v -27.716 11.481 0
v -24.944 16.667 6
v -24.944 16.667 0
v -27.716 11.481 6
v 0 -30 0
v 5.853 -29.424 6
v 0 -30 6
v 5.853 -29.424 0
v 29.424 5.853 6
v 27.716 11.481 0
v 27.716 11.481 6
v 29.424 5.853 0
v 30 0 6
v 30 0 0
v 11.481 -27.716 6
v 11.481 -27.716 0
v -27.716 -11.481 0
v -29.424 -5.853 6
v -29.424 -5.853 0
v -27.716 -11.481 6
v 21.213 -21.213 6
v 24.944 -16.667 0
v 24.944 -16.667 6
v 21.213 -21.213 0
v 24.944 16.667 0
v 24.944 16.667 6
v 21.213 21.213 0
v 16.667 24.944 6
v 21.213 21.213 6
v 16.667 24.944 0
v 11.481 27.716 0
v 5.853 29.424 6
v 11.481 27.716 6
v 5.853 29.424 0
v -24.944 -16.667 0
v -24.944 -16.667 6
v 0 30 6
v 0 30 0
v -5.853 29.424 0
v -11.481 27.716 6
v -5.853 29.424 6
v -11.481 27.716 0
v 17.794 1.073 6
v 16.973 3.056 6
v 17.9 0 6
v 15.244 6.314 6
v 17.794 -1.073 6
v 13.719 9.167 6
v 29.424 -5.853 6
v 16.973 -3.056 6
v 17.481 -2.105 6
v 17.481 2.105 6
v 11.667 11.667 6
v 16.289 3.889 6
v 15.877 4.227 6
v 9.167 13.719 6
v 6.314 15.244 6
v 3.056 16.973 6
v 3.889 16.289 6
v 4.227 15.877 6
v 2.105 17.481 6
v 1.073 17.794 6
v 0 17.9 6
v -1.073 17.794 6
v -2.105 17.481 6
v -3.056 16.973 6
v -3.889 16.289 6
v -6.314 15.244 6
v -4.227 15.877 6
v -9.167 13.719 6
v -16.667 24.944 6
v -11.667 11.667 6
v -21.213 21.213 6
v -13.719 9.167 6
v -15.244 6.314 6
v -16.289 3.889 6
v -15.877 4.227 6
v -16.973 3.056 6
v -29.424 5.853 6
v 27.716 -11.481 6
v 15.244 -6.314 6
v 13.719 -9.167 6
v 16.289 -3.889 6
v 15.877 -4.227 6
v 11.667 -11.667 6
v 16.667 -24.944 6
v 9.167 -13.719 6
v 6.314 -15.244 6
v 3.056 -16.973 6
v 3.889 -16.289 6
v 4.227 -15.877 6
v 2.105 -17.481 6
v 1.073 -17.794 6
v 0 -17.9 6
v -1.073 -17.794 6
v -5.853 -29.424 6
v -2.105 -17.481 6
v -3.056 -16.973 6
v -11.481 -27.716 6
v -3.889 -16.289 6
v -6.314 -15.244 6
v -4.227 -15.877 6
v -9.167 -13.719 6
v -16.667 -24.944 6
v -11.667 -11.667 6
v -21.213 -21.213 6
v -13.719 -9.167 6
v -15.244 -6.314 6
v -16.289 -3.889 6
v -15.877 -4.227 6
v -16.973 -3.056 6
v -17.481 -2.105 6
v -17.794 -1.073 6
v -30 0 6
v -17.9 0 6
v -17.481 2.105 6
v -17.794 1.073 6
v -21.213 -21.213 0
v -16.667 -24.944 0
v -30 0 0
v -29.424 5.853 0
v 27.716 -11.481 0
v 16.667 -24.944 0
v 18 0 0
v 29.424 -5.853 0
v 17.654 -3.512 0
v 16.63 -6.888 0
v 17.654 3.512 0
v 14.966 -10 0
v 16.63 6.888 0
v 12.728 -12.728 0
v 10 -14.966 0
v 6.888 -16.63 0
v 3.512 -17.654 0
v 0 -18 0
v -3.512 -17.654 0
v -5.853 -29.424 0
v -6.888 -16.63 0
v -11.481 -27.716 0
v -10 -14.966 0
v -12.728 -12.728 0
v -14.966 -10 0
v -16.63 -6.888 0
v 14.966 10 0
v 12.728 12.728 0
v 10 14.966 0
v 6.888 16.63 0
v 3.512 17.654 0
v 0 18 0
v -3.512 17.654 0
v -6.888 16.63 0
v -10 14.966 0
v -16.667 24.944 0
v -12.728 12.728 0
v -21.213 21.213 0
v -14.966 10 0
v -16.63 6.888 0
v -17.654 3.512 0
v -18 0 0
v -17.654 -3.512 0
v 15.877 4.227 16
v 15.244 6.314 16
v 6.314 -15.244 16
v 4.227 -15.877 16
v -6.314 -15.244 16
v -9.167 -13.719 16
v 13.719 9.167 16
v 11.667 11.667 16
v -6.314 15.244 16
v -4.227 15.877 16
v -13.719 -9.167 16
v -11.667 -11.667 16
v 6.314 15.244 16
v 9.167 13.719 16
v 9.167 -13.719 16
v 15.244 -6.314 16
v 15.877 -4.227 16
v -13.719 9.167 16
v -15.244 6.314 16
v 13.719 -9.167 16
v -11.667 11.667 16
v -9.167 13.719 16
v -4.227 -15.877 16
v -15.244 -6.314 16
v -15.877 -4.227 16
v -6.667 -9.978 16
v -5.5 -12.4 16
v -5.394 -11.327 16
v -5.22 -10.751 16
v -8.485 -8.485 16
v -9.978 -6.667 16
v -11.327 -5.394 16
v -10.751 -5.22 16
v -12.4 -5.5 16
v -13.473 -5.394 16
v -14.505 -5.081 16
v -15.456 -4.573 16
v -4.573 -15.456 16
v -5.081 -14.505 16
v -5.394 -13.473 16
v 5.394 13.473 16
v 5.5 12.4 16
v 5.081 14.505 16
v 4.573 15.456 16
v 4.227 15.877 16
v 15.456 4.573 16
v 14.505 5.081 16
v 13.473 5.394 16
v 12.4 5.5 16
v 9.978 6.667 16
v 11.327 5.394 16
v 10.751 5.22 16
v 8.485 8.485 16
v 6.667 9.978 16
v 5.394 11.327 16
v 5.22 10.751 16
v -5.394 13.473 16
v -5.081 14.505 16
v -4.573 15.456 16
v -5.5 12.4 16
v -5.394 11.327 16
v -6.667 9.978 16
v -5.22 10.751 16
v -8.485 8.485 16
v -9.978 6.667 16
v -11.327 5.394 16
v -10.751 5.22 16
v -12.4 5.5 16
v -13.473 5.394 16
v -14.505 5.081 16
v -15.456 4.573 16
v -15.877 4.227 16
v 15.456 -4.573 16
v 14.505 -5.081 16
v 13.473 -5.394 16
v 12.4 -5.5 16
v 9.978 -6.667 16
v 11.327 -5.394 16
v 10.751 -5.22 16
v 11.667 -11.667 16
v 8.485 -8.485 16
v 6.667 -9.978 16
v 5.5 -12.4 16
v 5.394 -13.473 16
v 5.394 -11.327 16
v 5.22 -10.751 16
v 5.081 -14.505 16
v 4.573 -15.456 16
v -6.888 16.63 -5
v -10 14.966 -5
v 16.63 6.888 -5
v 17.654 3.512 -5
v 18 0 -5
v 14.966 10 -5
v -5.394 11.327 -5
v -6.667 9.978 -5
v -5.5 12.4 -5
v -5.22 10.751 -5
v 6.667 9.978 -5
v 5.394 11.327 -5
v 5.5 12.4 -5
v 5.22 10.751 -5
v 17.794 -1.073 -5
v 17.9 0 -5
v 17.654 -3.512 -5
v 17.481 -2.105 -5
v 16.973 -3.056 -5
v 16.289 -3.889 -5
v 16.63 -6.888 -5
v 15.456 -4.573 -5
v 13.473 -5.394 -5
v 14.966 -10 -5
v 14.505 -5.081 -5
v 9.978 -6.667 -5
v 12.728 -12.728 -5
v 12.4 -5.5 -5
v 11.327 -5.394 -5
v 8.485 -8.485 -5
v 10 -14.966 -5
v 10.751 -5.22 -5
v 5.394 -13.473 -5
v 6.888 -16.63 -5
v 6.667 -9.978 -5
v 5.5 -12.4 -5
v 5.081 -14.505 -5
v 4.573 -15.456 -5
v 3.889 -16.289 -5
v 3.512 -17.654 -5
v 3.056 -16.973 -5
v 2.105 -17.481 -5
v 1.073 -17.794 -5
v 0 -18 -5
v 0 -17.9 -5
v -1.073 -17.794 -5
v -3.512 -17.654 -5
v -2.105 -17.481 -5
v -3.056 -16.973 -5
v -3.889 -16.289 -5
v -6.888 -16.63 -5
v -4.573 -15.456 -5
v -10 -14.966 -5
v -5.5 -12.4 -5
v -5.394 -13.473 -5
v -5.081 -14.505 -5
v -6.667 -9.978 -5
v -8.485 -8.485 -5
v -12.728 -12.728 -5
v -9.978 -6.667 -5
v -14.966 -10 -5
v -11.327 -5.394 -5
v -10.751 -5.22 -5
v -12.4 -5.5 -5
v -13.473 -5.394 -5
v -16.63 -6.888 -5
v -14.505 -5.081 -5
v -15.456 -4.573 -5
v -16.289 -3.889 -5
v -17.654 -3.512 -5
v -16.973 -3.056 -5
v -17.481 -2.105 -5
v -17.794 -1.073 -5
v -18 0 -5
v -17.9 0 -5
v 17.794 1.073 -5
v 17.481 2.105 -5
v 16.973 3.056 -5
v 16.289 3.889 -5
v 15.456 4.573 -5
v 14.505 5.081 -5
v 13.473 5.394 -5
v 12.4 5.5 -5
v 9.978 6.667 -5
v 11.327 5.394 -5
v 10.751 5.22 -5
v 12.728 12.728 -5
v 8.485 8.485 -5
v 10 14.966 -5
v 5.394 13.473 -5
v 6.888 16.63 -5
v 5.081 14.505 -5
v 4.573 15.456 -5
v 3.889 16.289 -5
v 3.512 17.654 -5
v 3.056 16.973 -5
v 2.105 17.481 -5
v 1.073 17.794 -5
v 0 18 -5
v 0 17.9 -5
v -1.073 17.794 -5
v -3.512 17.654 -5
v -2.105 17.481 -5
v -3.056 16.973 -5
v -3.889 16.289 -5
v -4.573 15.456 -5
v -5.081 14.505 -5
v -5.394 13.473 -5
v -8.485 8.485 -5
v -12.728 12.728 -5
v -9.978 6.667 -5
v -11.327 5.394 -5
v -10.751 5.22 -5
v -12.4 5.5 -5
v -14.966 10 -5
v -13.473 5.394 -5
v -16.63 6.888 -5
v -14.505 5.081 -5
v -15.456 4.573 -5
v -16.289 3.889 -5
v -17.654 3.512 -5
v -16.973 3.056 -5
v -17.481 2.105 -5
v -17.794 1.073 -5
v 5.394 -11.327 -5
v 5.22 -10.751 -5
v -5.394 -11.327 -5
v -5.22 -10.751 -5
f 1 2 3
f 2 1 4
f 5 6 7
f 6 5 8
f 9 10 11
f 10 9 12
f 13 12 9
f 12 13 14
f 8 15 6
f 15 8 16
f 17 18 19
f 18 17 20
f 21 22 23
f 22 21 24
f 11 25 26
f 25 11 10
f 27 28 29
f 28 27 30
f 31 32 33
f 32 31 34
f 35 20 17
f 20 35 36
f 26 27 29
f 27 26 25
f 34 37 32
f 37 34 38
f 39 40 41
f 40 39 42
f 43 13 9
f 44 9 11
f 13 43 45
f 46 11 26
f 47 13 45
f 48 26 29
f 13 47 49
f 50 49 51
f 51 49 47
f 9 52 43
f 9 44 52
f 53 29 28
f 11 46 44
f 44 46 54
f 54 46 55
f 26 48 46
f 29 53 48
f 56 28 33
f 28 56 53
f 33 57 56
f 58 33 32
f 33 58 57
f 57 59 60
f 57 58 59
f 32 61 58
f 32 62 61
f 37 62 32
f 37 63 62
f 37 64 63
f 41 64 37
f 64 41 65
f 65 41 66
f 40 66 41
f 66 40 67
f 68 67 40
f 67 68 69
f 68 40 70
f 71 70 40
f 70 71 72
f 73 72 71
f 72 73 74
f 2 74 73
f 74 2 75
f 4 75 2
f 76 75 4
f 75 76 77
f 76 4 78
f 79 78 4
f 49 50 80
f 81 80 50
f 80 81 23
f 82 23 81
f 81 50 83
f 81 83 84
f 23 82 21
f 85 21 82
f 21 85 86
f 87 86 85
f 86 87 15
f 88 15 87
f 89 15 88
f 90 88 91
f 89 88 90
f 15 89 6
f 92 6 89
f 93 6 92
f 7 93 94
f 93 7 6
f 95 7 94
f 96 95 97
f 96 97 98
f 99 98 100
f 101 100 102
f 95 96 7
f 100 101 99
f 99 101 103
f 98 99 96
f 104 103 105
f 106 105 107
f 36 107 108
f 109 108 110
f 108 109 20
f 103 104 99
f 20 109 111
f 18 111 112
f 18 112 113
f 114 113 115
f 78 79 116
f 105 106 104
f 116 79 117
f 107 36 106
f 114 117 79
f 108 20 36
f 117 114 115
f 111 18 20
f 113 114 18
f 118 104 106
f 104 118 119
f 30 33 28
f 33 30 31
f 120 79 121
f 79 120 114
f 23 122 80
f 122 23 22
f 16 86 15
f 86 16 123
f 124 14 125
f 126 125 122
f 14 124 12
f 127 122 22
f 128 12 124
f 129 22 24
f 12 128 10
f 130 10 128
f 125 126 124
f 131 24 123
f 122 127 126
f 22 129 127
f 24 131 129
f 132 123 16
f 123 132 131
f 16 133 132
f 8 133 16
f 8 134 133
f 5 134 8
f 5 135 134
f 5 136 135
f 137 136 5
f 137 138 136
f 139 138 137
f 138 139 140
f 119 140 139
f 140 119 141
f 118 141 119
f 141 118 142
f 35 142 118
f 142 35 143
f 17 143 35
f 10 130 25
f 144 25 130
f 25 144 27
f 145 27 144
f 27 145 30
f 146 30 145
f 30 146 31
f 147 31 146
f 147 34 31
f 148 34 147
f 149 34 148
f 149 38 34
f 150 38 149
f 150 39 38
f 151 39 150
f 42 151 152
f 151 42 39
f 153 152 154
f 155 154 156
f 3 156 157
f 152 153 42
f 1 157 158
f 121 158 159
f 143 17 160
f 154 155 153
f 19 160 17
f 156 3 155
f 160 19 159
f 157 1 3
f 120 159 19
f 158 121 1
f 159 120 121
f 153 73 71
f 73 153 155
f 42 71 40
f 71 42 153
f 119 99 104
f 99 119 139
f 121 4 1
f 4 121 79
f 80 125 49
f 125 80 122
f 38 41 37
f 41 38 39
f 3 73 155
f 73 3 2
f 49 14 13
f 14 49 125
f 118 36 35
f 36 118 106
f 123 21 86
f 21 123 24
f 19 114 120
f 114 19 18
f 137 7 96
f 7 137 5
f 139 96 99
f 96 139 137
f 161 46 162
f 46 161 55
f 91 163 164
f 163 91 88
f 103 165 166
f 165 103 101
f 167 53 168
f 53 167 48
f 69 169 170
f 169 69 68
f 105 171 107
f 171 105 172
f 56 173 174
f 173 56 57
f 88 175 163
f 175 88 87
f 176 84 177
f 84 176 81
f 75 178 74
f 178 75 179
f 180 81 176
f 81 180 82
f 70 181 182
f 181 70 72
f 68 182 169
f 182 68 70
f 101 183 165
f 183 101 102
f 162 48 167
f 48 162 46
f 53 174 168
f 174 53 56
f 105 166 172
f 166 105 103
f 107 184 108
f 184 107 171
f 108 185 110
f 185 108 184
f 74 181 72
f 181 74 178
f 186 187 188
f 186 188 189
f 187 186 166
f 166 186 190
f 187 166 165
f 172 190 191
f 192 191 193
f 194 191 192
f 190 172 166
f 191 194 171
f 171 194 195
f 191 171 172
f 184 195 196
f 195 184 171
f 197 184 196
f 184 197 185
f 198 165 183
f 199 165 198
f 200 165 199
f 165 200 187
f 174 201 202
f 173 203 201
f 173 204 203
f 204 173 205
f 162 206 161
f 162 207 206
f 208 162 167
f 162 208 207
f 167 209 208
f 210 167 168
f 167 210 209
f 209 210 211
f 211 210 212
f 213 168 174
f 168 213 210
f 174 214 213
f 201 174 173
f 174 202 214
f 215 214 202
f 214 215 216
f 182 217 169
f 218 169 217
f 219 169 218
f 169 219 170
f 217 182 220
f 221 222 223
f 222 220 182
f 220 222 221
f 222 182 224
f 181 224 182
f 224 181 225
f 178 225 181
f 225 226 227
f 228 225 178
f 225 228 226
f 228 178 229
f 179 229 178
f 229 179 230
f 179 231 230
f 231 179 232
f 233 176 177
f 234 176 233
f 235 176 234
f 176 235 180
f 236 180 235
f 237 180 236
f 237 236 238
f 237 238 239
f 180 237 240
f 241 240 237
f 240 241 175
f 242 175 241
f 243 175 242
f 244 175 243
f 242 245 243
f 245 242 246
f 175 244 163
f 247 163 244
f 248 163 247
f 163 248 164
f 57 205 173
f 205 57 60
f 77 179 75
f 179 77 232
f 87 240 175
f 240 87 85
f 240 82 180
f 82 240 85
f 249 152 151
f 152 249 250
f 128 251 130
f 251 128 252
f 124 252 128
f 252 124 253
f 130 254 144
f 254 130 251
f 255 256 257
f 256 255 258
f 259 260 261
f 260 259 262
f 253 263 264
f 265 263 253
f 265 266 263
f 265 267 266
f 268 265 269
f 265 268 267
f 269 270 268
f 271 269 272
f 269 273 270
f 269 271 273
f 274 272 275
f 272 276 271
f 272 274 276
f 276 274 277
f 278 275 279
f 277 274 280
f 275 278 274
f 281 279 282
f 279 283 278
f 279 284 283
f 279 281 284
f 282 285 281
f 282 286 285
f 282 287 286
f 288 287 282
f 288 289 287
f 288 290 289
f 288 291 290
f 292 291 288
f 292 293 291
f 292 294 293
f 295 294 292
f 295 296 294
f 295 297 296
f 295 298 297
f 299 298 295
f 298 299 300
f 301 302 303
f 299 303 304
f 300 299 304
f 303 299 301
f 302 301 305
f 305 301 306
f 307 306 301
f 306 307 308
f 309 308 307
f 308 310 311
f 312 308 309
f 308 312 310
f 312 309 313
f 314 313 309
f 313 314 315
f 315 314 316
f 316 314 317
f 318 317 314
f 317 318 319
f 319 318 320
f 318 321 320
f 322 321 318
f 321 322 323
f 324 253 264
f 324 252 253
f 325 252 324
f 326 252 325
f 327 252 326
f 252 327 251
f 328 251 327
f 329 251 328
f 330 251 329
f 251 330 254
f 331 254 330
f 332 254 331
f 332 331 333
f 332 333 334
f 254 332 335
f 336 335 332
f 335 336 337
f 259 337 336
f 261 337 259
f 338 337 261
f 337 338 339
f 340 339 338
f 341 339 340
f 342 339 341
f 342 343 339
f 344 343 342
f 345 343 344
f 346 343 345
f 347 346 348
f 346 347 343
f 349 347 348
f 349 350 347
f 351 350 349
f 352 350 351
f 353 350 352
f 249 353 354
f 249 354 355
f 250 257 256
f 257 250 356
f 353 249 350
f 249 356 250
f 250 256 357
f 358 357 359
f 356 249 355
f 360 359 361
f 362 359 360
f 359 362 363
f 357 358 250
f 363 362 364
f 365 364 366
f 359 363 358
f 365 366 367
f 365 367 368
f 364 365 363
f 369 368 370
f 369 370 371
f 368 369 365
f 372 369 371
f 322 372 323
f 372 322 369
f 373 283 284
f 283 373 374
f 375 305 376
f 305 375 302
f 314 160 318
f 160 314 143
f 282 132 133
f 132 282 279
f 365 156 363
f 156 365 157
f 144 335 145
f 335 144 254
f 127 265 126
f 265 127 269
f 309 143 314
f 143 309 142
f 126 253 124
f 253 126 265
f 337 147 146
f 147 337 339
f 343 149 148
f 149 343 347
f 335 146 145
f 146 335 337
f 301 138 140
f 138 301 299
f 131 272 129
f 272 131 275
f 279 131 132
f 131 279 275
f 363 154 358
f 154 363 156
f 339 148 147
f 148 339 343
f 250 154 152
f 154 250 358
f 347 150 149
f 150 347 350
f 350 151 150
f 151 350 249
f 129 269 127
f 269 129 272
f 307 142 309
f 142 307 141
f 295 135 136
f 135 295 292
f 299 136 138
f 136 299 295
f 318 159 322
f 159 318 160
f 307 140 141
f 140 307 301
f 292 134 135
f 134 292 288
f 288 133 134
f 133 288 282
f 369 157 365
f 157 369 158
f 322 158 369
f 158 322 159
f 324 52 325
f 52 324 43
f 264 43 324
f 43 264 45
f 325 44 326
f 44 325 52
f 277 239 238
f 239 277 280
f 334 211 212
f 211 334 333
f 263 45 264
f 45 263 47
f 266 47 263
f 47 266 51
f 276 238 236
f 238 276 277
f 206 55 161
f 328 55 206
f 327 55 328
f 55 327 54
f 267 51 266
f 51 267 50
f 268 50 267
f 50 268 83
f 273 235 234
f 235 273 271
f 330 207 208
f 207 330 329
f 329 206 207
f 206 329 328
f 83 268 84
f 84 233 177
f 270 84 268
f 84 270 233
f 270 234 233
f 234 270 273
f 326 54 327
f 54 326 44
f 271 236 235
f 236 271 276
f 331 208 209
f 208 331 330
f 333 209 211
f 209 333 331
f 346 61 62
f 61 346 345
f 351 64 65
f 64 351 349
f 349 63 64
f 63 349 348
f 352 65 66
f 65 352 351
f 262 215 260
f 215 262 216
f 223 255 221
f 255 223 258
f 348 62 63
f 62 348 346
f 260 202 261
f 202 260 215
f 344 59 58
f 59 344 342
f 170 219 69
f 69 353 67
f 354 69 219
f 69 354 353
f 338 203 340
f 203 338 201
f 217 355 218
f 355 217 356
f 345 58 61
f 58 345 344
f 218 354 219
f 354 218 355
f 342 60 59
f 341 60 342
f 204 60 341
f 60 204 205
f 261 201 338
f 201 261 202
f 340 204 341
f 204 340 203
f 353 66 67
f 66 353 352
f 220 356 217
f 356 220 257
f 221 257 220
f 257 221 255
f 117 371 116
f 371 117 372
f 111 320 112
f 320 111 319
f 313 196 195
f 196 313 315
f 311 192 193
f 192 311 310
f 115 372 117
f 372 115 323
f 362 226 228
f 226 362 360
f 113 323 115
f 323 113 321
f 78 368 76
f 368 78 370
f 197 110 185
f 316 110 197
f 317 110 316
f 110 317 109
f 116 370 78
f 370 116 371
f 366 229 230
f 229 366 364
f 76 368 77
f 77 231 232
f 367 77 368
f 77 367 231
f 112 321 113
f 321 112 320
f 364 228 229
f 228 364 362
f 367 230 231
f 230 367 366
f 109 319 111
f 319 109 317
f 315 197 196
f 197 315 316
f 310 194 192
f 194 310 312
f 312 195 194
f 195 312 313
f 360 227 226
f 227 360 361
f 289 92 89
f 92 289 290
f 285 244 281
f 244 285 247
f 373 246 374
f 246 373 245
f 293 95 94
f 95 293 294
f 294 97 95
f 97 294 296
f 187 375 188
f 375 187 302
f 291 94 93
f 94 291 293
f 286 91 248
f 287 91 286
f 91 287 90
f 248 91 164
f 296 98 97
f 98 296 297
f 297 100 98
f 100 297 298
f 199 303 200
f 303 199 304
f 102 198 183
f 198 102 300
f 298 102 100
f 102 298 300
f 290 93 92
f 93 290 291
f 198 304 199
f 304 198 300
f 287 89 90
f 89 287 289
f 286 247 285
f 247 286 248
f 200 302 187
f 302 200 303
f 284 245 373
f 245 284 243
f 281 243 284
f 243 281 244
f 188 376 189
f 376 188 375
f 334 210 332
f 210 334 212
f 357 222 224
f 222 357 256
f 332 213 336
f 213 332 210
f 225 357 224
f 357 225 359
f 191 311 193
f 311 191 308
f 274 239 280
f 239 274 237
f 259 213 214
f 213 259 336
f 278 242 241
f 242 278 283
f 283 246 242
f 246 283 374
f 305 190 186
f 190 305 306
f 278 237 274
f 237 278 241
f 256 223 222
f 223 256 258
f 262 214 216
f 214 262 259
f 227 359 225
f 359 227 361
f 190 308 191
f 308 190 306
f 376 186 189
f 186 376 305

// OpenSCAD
$fn = 32;

// ----------------------------------------------------------------------
// Bolt-circle flange: 60 mm outside, 4 bolt holes, bore 24 mm
// ----------------------------------------------------------------------

// --- parameters (mm) ---
flange_d = 60;            // flange outside diameter
flange_t = 6;             // flange thickness
bolts = 4;                // number of bolt holes
bolt_d = 11;              // bolt clearance
bolt_r = 12.4;            // bolt circle radius
bore_d = 24;              // centre bore
hub_d = 33;               // raised hub diameter
hub_h = 10;               // raised hub height
spigot_d = 36;            // spigot diameter
spigot_h = 6;             // spigot height below the flange
sink = 1;                 // overlap into the flange

module body() {
  cylinder(h = flange_t, d = flange_d);
  /* raised hub, sunk 1 mm into the flange */
  translate([0, 0, flange_t - 1]) cylinder(h = hub_h + 1, d = hub_d);
  /* spigot on the back face, sunk into the flange */
  translate([0, 0, -spigot_h + sink]) cylinder(h = spigot_h, d = spigot_d);
}

difference() {
  body();
  /* bolt circle */
  for (i = [0 : bolts - 1]) rotate([0, 0, i * 360 / bolts]) translate([bolt_r, 0, -spigot_h - 1]) cylinder(h = flange_t + hub_h + spigot_h + 3, d = bolt_d);
  translate([0, 0, -spigot_h - 1]) cylinder(h = flange_t + hub_h + spigot_h + 3, d = bore_d);
}
